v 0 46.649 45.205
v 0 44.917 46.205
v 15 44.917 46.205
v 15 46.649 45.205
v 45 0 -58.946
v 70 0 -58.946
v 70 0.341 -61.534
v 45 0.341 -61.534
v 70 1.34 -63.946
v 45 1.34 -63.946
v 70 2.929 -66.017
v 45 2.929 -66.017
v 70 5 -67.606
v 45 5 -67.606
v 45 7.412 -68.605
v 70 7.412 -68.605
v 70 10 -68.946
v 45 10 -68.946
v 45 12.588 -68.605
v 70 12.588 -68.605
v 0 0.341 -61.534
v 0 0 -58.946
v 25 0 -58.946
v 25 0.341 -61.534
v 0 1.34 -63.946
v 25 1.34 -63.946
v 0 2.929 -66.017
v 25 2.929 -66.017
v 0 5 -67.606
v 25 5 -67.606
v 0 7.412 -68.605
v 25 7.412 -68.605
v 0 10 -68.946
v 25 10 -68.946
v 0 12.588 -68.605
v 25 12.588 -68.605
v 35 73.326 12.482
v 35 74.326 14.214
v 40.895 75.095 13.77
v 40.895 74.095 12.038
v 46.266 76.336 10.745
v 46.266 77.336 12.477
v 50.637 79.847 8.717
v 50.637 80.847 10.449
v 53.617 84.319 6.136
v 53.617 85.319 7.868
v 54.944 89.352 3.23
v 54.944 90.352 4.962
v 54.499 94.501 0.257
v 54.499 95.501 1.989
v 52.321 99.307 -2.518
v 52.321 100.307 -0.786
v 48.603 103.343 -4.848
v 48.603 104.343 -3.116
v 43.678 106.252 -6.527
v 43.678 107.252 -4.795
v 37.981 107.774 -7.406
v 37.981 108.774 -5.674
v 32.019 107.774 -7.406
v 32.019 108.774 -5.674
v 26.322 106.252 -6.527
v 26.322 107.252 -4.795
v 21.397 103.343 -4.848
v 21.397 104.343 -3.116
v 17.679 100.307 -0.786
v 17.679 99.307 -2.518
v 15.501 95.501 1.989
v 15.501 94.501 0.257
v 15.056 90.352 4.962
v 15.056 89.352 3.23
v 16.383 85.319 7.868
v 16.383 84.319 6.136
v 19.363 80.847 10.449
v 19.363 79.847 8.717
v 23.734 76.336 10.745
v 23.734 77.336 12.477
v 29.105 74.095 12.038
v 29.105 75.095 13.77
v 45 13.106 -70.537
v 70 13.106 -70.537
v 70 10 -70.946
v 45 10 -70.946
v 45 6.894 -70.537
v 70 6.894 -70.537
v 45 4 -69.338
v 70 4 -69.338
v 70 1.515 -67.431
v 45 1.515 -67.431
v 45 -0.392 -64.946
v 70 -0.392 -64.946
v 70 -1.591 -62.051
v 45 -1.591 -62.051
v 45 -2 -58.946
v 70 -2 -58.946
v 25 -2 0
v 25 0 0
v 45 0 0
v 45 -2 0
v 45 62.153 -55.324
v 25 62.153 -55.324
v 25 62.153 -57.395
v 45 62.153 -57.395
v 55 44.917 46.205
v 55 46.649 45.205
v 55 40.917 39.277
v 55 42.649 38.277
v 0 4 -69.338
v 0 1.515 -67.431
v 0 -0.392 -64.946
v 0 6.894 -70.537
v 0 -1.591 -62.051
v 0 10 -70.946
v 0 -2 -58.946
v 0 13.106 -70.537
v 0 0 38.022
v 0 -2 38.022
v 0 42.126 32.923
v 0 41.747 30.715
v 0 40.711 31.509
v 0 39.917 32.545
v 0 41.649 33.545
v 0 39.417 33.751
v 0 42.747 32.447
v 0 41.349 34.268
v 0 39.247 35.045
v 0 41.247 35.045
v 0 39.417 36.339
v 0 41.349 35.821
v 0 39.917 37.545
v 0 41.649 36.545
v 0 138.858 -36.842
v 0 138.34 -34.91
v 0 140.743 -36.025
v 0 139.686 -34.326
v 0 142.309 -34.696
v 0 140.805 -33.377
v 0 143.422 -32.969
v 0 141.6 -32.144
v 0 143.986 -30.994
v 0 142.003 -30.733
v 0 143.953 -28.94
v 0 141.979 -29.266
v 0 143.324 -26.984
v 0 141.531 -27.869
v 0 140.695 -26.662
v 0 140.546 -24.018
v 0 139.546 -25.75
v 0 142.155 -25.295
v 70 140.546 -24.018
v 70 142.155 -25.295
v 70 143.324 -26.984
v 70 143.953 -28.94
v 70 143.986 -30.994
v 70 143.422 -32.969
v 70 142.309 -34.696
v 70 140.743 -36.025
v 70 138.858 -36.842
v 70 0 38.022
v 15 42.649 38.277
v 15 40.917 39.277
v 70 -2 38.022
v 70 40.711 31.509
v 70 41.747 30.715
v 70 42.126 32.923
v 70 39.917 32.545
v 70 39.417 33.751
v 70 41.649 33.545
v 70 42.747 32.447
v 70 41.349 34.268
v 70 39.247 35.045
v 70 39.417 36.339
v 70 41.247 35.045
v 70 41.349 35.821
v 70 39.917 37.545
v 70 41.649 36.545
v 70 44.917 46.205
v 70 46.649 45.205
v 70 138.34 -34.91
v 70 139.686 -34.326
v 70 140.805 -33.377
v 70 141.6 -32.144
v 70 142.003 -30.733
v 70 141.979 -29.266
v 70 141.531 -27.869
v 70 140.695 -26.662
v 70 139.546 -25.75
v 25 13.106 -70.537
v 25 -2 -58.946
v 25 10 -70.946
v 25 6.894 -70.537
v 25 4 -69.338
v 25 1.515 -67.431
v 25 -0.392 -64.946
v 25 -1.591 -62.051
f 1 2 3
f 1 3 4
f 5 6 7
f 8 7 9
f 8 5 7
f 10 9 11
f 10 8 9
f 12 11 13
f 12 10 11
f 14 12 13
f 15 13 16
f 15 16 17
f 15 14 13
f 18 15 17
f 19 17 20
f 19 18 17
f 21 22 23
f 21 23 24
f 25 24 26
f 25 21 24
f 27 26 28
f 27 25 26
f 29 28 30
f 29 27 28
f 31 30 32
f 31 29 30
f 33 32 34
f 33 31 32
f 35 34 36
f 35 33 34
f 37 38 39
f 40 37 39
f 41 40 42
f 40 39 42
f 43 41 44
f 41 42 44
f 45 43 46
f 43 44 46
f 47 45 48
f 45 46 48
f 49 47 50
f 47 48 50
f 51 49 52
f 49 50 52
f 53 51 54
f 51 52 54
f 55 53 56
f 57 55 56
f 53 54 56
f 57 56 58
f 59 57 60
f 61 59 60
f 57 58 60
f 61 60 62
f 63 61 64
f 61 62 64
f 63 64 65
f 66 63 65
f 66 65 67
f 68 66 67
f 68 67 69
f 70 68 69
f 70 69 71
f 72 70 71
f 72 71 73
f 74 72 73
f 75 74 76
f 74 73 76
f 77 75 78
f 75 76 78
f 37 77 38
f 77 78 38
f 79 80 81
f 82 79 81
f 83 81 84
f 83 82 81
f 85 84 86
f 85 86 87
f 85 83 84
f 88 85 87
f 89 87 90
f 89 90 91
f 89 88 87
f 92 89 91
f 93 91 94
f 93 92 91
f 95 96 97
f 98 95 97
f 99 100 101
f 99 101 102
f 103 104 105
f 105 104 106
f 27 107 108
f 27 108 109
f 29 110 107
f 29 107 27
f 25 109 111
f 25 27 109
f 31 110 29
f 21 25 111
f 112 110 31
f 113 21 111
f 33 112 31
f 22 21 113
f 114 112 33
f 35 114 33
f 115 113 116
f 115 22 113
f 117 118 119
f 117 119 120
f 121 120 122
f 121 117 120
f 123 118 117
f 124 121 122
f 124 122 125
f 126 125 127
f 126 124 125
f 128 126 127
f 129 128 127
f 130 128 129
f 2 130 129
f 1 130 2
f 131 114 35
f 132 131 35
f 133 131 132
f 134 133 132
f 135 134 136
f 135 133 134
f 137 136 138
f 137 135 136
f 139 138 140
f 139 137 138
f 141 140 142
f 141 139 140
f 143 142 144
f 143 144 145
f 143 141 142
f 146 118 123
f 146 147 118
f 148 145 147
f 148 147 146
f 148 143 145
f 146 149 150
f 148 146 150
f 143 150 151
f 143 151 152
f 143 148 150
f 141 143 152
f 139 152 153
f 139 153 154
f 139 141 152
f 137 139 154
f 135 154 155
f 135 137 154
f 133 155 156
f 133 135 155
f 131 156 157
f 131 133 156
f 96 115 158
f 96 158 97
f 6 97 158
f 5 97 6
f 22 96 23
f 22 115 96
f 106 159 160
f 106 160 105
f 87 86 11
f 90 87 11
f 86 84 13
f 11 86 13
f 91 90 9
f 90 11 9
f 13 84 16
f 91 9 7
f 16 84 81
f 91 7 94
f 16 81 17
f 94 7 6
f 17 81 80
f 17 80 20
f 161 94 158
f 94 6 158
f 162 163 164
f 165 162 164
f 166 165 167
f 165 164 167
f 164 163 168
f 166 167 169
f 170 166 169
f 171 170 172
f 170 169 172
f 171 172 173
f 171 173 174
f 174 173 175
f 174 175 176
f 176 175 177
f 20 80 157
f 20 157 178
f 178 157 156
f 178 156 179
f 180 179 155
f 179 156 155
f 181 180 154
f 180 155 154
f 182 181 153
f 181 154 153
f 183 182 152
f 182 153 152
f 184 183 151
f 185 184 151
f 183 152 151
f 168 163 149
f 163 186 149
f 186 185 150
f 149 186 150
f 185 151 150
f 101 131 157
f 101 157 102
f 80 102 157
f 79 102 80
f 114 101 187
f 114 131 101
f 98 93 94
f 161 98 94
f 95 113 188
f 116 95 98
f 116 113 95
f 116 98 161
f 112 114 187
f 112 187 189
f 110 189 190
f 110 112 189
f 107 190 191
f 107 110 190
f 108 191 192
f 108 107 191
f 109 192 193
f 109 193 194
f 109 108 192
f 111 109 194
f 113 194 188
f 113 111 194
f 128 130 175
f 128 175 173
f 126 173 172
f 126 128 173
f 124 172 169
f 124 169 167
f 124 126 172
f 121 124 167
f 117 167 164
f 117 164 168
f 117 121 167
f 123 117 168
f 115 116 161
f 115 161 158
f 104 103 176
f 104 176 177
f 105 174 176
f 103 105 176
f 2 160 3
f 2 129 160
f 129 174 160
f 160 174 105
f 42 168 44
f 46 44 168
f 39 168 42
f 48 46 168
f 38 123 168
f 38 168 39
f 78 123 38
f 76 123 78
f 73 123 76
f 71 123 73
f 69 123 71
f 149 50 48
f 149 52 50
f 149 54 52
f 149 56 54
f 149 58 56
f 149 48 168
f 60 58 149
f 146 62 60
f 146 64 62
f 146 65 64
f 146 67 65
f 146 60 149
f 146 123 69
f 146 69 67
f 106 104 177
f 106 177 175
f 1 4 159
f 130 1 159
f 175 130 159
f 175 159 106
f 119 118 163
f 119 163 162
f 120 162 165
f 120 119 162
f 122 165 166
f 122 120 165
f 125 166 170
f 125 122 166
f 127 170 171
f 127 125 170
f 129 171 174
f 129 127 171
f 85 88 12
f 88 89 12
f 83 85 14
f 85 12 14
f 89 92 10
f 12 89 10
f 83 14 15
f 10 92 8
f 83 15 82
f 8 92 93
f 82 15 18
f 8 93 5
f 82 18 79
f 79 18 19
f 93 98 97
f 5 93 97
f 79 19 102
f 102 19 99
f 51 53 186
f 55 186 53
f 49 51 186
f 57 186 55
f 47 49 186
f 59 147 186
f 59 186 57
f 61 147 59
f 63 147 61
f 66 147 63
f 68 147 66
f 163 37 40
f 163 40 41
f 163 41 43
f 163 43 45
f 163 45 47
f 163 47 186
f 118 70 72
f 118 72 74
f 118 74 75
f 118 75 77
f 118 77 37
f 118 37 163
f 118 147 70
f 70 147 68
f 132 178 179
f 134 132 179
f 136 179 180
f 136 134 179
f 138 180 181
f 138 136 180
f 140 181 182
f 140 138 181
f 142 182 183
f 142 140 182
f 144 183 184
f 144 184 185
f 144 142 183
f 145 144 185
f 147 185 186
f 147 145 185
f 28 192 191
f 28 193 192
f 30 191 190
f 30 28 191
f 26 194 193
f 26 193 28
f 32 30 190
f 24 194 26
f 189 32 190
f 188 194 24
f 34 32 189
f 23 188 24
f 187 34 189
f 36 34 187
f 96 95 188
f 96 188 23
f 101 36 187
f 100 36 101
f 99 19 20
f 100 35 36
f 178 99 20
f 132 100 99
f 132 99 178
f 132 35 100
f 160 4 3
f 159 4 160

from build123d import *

# Parameters (mm, degrees)
EXTRUDE_THIN1_DEPTH = 70
SKETCH2_W           = 40
SKETCH2_H           = 8
CUT_EXTRUDE1_DEPTH  = 10
SKETCH3_W           = 20
SKETCH3_H           = 100
CUT_EXTRUDE2_DEPTH  = 90
SKETCH9_R           = 20
CUT_EXTRUDE9_DEPTH  = 2


with BuildPart() as part:
    # Sketch1 → Extrude-Thin1 (new body)
    with BuildSketch(Plane(origin=(0, 0, 0), x_dir=(0, 0, -1), z_dir=(1, 0, 0))):
        with BuildLine():
            Line((-38.022129, 0), (58.945617271, 0))
            ThreePointArc((58.945617271, 0), (66.879150674, 3.91238571), (68.604875534, 12.588190451))
            Line((68.604875534, 12.588190451), (34.909714379, 138.34024385))
            ThreePointArc((34.909714379, 138.34024385), (30.732716209, 142.003372931), (25.749958229, 139.546148624))
            Line((25.749958229, 139.546148624), (-30.714507865, 41.746824527))
            ThreePointArc((-30.714507865, 41.746824527), (-33.750539659, 39.417195395), (-37.544634884, 39.916697508))
            Line((-37.544634884, 39.916697508), (-46.204888922, 44.916697508))
            Line((-46.204888922, 44.916697508), (-45.204888922, 46.648748316))
            Line((-45.204888922, 46.648748316), (-36.544634884, 41.648748316))
            ThreePointArc((-36.544634884, 41.648748316), (-34.268177749, 41.349047048), (-32.446558673, 42.746824527))
            Line((-32.446558673, 42.746824527), (24.017907421, 140.546148624))
            ThreePointArc((24.017907421, 140.546148624), (30.993768593, 143.986262654), (36.841566032, 138.85788194))
            Line((36.841566032, 138.85788194), (70.536727187, 13.105828541))
            ThreePointArc((70.536727187, 13.105828541), (68.465857355, 2.694862852), (58.945617271, -2))
            Line((58.945617271, -2), (-38.022129, -2))
            Line((-38.022129, -2), (-38.022129, 0))
        make_face()
    extrude(amount=EXTRUDE_THIN1_DEPTH)

    # Sketch2 → Cut-Extrude1 (cut)
    with BuildSketch(Plane(origin=(0, 15.412270146, -8.898278318), x_dir=(1, 0, 0), z_dir=(0, 0.8660254037844438, -0.4999999999999912))):
        with Locations((35, -58.472956339)):
            Rectangle(SKETCH2_W, SKETCH2_H)
    extrude(amount=-CUT_EXTRUDE1_DEPTH, mode=Mode.SUBTRACT)

    # Sketch3 → Cut-Extrude2 (cut)
    with BuildSketch(Plane.XY):
        with Locations((35, 12.152835355)):
            Rectangle(SKETCH3_W, SKETCH3_H)
    extrude(amount=-CUT_EXTRUDE2_DEPTH, mode=Mode.SUBTRACT)

    # Sketch9 → Cut-Extrude9 (cut)
    with BuildSketch(Plane(origin=(0, 24.73647817, 42.84483699), x_dir=(1, 0, 0), z_dir=(0, 0.4999999999999915, 0.8660254037844435))):
        with Locations(Location((35, 77.261022729, 0), (0, 0, 270))):
            Circle(SKETCH9_R)
    extrude(amount=-CUT_EXTRUDE9_DEPTH, mode=Mode.SUBTRACT)


solid = part.part
